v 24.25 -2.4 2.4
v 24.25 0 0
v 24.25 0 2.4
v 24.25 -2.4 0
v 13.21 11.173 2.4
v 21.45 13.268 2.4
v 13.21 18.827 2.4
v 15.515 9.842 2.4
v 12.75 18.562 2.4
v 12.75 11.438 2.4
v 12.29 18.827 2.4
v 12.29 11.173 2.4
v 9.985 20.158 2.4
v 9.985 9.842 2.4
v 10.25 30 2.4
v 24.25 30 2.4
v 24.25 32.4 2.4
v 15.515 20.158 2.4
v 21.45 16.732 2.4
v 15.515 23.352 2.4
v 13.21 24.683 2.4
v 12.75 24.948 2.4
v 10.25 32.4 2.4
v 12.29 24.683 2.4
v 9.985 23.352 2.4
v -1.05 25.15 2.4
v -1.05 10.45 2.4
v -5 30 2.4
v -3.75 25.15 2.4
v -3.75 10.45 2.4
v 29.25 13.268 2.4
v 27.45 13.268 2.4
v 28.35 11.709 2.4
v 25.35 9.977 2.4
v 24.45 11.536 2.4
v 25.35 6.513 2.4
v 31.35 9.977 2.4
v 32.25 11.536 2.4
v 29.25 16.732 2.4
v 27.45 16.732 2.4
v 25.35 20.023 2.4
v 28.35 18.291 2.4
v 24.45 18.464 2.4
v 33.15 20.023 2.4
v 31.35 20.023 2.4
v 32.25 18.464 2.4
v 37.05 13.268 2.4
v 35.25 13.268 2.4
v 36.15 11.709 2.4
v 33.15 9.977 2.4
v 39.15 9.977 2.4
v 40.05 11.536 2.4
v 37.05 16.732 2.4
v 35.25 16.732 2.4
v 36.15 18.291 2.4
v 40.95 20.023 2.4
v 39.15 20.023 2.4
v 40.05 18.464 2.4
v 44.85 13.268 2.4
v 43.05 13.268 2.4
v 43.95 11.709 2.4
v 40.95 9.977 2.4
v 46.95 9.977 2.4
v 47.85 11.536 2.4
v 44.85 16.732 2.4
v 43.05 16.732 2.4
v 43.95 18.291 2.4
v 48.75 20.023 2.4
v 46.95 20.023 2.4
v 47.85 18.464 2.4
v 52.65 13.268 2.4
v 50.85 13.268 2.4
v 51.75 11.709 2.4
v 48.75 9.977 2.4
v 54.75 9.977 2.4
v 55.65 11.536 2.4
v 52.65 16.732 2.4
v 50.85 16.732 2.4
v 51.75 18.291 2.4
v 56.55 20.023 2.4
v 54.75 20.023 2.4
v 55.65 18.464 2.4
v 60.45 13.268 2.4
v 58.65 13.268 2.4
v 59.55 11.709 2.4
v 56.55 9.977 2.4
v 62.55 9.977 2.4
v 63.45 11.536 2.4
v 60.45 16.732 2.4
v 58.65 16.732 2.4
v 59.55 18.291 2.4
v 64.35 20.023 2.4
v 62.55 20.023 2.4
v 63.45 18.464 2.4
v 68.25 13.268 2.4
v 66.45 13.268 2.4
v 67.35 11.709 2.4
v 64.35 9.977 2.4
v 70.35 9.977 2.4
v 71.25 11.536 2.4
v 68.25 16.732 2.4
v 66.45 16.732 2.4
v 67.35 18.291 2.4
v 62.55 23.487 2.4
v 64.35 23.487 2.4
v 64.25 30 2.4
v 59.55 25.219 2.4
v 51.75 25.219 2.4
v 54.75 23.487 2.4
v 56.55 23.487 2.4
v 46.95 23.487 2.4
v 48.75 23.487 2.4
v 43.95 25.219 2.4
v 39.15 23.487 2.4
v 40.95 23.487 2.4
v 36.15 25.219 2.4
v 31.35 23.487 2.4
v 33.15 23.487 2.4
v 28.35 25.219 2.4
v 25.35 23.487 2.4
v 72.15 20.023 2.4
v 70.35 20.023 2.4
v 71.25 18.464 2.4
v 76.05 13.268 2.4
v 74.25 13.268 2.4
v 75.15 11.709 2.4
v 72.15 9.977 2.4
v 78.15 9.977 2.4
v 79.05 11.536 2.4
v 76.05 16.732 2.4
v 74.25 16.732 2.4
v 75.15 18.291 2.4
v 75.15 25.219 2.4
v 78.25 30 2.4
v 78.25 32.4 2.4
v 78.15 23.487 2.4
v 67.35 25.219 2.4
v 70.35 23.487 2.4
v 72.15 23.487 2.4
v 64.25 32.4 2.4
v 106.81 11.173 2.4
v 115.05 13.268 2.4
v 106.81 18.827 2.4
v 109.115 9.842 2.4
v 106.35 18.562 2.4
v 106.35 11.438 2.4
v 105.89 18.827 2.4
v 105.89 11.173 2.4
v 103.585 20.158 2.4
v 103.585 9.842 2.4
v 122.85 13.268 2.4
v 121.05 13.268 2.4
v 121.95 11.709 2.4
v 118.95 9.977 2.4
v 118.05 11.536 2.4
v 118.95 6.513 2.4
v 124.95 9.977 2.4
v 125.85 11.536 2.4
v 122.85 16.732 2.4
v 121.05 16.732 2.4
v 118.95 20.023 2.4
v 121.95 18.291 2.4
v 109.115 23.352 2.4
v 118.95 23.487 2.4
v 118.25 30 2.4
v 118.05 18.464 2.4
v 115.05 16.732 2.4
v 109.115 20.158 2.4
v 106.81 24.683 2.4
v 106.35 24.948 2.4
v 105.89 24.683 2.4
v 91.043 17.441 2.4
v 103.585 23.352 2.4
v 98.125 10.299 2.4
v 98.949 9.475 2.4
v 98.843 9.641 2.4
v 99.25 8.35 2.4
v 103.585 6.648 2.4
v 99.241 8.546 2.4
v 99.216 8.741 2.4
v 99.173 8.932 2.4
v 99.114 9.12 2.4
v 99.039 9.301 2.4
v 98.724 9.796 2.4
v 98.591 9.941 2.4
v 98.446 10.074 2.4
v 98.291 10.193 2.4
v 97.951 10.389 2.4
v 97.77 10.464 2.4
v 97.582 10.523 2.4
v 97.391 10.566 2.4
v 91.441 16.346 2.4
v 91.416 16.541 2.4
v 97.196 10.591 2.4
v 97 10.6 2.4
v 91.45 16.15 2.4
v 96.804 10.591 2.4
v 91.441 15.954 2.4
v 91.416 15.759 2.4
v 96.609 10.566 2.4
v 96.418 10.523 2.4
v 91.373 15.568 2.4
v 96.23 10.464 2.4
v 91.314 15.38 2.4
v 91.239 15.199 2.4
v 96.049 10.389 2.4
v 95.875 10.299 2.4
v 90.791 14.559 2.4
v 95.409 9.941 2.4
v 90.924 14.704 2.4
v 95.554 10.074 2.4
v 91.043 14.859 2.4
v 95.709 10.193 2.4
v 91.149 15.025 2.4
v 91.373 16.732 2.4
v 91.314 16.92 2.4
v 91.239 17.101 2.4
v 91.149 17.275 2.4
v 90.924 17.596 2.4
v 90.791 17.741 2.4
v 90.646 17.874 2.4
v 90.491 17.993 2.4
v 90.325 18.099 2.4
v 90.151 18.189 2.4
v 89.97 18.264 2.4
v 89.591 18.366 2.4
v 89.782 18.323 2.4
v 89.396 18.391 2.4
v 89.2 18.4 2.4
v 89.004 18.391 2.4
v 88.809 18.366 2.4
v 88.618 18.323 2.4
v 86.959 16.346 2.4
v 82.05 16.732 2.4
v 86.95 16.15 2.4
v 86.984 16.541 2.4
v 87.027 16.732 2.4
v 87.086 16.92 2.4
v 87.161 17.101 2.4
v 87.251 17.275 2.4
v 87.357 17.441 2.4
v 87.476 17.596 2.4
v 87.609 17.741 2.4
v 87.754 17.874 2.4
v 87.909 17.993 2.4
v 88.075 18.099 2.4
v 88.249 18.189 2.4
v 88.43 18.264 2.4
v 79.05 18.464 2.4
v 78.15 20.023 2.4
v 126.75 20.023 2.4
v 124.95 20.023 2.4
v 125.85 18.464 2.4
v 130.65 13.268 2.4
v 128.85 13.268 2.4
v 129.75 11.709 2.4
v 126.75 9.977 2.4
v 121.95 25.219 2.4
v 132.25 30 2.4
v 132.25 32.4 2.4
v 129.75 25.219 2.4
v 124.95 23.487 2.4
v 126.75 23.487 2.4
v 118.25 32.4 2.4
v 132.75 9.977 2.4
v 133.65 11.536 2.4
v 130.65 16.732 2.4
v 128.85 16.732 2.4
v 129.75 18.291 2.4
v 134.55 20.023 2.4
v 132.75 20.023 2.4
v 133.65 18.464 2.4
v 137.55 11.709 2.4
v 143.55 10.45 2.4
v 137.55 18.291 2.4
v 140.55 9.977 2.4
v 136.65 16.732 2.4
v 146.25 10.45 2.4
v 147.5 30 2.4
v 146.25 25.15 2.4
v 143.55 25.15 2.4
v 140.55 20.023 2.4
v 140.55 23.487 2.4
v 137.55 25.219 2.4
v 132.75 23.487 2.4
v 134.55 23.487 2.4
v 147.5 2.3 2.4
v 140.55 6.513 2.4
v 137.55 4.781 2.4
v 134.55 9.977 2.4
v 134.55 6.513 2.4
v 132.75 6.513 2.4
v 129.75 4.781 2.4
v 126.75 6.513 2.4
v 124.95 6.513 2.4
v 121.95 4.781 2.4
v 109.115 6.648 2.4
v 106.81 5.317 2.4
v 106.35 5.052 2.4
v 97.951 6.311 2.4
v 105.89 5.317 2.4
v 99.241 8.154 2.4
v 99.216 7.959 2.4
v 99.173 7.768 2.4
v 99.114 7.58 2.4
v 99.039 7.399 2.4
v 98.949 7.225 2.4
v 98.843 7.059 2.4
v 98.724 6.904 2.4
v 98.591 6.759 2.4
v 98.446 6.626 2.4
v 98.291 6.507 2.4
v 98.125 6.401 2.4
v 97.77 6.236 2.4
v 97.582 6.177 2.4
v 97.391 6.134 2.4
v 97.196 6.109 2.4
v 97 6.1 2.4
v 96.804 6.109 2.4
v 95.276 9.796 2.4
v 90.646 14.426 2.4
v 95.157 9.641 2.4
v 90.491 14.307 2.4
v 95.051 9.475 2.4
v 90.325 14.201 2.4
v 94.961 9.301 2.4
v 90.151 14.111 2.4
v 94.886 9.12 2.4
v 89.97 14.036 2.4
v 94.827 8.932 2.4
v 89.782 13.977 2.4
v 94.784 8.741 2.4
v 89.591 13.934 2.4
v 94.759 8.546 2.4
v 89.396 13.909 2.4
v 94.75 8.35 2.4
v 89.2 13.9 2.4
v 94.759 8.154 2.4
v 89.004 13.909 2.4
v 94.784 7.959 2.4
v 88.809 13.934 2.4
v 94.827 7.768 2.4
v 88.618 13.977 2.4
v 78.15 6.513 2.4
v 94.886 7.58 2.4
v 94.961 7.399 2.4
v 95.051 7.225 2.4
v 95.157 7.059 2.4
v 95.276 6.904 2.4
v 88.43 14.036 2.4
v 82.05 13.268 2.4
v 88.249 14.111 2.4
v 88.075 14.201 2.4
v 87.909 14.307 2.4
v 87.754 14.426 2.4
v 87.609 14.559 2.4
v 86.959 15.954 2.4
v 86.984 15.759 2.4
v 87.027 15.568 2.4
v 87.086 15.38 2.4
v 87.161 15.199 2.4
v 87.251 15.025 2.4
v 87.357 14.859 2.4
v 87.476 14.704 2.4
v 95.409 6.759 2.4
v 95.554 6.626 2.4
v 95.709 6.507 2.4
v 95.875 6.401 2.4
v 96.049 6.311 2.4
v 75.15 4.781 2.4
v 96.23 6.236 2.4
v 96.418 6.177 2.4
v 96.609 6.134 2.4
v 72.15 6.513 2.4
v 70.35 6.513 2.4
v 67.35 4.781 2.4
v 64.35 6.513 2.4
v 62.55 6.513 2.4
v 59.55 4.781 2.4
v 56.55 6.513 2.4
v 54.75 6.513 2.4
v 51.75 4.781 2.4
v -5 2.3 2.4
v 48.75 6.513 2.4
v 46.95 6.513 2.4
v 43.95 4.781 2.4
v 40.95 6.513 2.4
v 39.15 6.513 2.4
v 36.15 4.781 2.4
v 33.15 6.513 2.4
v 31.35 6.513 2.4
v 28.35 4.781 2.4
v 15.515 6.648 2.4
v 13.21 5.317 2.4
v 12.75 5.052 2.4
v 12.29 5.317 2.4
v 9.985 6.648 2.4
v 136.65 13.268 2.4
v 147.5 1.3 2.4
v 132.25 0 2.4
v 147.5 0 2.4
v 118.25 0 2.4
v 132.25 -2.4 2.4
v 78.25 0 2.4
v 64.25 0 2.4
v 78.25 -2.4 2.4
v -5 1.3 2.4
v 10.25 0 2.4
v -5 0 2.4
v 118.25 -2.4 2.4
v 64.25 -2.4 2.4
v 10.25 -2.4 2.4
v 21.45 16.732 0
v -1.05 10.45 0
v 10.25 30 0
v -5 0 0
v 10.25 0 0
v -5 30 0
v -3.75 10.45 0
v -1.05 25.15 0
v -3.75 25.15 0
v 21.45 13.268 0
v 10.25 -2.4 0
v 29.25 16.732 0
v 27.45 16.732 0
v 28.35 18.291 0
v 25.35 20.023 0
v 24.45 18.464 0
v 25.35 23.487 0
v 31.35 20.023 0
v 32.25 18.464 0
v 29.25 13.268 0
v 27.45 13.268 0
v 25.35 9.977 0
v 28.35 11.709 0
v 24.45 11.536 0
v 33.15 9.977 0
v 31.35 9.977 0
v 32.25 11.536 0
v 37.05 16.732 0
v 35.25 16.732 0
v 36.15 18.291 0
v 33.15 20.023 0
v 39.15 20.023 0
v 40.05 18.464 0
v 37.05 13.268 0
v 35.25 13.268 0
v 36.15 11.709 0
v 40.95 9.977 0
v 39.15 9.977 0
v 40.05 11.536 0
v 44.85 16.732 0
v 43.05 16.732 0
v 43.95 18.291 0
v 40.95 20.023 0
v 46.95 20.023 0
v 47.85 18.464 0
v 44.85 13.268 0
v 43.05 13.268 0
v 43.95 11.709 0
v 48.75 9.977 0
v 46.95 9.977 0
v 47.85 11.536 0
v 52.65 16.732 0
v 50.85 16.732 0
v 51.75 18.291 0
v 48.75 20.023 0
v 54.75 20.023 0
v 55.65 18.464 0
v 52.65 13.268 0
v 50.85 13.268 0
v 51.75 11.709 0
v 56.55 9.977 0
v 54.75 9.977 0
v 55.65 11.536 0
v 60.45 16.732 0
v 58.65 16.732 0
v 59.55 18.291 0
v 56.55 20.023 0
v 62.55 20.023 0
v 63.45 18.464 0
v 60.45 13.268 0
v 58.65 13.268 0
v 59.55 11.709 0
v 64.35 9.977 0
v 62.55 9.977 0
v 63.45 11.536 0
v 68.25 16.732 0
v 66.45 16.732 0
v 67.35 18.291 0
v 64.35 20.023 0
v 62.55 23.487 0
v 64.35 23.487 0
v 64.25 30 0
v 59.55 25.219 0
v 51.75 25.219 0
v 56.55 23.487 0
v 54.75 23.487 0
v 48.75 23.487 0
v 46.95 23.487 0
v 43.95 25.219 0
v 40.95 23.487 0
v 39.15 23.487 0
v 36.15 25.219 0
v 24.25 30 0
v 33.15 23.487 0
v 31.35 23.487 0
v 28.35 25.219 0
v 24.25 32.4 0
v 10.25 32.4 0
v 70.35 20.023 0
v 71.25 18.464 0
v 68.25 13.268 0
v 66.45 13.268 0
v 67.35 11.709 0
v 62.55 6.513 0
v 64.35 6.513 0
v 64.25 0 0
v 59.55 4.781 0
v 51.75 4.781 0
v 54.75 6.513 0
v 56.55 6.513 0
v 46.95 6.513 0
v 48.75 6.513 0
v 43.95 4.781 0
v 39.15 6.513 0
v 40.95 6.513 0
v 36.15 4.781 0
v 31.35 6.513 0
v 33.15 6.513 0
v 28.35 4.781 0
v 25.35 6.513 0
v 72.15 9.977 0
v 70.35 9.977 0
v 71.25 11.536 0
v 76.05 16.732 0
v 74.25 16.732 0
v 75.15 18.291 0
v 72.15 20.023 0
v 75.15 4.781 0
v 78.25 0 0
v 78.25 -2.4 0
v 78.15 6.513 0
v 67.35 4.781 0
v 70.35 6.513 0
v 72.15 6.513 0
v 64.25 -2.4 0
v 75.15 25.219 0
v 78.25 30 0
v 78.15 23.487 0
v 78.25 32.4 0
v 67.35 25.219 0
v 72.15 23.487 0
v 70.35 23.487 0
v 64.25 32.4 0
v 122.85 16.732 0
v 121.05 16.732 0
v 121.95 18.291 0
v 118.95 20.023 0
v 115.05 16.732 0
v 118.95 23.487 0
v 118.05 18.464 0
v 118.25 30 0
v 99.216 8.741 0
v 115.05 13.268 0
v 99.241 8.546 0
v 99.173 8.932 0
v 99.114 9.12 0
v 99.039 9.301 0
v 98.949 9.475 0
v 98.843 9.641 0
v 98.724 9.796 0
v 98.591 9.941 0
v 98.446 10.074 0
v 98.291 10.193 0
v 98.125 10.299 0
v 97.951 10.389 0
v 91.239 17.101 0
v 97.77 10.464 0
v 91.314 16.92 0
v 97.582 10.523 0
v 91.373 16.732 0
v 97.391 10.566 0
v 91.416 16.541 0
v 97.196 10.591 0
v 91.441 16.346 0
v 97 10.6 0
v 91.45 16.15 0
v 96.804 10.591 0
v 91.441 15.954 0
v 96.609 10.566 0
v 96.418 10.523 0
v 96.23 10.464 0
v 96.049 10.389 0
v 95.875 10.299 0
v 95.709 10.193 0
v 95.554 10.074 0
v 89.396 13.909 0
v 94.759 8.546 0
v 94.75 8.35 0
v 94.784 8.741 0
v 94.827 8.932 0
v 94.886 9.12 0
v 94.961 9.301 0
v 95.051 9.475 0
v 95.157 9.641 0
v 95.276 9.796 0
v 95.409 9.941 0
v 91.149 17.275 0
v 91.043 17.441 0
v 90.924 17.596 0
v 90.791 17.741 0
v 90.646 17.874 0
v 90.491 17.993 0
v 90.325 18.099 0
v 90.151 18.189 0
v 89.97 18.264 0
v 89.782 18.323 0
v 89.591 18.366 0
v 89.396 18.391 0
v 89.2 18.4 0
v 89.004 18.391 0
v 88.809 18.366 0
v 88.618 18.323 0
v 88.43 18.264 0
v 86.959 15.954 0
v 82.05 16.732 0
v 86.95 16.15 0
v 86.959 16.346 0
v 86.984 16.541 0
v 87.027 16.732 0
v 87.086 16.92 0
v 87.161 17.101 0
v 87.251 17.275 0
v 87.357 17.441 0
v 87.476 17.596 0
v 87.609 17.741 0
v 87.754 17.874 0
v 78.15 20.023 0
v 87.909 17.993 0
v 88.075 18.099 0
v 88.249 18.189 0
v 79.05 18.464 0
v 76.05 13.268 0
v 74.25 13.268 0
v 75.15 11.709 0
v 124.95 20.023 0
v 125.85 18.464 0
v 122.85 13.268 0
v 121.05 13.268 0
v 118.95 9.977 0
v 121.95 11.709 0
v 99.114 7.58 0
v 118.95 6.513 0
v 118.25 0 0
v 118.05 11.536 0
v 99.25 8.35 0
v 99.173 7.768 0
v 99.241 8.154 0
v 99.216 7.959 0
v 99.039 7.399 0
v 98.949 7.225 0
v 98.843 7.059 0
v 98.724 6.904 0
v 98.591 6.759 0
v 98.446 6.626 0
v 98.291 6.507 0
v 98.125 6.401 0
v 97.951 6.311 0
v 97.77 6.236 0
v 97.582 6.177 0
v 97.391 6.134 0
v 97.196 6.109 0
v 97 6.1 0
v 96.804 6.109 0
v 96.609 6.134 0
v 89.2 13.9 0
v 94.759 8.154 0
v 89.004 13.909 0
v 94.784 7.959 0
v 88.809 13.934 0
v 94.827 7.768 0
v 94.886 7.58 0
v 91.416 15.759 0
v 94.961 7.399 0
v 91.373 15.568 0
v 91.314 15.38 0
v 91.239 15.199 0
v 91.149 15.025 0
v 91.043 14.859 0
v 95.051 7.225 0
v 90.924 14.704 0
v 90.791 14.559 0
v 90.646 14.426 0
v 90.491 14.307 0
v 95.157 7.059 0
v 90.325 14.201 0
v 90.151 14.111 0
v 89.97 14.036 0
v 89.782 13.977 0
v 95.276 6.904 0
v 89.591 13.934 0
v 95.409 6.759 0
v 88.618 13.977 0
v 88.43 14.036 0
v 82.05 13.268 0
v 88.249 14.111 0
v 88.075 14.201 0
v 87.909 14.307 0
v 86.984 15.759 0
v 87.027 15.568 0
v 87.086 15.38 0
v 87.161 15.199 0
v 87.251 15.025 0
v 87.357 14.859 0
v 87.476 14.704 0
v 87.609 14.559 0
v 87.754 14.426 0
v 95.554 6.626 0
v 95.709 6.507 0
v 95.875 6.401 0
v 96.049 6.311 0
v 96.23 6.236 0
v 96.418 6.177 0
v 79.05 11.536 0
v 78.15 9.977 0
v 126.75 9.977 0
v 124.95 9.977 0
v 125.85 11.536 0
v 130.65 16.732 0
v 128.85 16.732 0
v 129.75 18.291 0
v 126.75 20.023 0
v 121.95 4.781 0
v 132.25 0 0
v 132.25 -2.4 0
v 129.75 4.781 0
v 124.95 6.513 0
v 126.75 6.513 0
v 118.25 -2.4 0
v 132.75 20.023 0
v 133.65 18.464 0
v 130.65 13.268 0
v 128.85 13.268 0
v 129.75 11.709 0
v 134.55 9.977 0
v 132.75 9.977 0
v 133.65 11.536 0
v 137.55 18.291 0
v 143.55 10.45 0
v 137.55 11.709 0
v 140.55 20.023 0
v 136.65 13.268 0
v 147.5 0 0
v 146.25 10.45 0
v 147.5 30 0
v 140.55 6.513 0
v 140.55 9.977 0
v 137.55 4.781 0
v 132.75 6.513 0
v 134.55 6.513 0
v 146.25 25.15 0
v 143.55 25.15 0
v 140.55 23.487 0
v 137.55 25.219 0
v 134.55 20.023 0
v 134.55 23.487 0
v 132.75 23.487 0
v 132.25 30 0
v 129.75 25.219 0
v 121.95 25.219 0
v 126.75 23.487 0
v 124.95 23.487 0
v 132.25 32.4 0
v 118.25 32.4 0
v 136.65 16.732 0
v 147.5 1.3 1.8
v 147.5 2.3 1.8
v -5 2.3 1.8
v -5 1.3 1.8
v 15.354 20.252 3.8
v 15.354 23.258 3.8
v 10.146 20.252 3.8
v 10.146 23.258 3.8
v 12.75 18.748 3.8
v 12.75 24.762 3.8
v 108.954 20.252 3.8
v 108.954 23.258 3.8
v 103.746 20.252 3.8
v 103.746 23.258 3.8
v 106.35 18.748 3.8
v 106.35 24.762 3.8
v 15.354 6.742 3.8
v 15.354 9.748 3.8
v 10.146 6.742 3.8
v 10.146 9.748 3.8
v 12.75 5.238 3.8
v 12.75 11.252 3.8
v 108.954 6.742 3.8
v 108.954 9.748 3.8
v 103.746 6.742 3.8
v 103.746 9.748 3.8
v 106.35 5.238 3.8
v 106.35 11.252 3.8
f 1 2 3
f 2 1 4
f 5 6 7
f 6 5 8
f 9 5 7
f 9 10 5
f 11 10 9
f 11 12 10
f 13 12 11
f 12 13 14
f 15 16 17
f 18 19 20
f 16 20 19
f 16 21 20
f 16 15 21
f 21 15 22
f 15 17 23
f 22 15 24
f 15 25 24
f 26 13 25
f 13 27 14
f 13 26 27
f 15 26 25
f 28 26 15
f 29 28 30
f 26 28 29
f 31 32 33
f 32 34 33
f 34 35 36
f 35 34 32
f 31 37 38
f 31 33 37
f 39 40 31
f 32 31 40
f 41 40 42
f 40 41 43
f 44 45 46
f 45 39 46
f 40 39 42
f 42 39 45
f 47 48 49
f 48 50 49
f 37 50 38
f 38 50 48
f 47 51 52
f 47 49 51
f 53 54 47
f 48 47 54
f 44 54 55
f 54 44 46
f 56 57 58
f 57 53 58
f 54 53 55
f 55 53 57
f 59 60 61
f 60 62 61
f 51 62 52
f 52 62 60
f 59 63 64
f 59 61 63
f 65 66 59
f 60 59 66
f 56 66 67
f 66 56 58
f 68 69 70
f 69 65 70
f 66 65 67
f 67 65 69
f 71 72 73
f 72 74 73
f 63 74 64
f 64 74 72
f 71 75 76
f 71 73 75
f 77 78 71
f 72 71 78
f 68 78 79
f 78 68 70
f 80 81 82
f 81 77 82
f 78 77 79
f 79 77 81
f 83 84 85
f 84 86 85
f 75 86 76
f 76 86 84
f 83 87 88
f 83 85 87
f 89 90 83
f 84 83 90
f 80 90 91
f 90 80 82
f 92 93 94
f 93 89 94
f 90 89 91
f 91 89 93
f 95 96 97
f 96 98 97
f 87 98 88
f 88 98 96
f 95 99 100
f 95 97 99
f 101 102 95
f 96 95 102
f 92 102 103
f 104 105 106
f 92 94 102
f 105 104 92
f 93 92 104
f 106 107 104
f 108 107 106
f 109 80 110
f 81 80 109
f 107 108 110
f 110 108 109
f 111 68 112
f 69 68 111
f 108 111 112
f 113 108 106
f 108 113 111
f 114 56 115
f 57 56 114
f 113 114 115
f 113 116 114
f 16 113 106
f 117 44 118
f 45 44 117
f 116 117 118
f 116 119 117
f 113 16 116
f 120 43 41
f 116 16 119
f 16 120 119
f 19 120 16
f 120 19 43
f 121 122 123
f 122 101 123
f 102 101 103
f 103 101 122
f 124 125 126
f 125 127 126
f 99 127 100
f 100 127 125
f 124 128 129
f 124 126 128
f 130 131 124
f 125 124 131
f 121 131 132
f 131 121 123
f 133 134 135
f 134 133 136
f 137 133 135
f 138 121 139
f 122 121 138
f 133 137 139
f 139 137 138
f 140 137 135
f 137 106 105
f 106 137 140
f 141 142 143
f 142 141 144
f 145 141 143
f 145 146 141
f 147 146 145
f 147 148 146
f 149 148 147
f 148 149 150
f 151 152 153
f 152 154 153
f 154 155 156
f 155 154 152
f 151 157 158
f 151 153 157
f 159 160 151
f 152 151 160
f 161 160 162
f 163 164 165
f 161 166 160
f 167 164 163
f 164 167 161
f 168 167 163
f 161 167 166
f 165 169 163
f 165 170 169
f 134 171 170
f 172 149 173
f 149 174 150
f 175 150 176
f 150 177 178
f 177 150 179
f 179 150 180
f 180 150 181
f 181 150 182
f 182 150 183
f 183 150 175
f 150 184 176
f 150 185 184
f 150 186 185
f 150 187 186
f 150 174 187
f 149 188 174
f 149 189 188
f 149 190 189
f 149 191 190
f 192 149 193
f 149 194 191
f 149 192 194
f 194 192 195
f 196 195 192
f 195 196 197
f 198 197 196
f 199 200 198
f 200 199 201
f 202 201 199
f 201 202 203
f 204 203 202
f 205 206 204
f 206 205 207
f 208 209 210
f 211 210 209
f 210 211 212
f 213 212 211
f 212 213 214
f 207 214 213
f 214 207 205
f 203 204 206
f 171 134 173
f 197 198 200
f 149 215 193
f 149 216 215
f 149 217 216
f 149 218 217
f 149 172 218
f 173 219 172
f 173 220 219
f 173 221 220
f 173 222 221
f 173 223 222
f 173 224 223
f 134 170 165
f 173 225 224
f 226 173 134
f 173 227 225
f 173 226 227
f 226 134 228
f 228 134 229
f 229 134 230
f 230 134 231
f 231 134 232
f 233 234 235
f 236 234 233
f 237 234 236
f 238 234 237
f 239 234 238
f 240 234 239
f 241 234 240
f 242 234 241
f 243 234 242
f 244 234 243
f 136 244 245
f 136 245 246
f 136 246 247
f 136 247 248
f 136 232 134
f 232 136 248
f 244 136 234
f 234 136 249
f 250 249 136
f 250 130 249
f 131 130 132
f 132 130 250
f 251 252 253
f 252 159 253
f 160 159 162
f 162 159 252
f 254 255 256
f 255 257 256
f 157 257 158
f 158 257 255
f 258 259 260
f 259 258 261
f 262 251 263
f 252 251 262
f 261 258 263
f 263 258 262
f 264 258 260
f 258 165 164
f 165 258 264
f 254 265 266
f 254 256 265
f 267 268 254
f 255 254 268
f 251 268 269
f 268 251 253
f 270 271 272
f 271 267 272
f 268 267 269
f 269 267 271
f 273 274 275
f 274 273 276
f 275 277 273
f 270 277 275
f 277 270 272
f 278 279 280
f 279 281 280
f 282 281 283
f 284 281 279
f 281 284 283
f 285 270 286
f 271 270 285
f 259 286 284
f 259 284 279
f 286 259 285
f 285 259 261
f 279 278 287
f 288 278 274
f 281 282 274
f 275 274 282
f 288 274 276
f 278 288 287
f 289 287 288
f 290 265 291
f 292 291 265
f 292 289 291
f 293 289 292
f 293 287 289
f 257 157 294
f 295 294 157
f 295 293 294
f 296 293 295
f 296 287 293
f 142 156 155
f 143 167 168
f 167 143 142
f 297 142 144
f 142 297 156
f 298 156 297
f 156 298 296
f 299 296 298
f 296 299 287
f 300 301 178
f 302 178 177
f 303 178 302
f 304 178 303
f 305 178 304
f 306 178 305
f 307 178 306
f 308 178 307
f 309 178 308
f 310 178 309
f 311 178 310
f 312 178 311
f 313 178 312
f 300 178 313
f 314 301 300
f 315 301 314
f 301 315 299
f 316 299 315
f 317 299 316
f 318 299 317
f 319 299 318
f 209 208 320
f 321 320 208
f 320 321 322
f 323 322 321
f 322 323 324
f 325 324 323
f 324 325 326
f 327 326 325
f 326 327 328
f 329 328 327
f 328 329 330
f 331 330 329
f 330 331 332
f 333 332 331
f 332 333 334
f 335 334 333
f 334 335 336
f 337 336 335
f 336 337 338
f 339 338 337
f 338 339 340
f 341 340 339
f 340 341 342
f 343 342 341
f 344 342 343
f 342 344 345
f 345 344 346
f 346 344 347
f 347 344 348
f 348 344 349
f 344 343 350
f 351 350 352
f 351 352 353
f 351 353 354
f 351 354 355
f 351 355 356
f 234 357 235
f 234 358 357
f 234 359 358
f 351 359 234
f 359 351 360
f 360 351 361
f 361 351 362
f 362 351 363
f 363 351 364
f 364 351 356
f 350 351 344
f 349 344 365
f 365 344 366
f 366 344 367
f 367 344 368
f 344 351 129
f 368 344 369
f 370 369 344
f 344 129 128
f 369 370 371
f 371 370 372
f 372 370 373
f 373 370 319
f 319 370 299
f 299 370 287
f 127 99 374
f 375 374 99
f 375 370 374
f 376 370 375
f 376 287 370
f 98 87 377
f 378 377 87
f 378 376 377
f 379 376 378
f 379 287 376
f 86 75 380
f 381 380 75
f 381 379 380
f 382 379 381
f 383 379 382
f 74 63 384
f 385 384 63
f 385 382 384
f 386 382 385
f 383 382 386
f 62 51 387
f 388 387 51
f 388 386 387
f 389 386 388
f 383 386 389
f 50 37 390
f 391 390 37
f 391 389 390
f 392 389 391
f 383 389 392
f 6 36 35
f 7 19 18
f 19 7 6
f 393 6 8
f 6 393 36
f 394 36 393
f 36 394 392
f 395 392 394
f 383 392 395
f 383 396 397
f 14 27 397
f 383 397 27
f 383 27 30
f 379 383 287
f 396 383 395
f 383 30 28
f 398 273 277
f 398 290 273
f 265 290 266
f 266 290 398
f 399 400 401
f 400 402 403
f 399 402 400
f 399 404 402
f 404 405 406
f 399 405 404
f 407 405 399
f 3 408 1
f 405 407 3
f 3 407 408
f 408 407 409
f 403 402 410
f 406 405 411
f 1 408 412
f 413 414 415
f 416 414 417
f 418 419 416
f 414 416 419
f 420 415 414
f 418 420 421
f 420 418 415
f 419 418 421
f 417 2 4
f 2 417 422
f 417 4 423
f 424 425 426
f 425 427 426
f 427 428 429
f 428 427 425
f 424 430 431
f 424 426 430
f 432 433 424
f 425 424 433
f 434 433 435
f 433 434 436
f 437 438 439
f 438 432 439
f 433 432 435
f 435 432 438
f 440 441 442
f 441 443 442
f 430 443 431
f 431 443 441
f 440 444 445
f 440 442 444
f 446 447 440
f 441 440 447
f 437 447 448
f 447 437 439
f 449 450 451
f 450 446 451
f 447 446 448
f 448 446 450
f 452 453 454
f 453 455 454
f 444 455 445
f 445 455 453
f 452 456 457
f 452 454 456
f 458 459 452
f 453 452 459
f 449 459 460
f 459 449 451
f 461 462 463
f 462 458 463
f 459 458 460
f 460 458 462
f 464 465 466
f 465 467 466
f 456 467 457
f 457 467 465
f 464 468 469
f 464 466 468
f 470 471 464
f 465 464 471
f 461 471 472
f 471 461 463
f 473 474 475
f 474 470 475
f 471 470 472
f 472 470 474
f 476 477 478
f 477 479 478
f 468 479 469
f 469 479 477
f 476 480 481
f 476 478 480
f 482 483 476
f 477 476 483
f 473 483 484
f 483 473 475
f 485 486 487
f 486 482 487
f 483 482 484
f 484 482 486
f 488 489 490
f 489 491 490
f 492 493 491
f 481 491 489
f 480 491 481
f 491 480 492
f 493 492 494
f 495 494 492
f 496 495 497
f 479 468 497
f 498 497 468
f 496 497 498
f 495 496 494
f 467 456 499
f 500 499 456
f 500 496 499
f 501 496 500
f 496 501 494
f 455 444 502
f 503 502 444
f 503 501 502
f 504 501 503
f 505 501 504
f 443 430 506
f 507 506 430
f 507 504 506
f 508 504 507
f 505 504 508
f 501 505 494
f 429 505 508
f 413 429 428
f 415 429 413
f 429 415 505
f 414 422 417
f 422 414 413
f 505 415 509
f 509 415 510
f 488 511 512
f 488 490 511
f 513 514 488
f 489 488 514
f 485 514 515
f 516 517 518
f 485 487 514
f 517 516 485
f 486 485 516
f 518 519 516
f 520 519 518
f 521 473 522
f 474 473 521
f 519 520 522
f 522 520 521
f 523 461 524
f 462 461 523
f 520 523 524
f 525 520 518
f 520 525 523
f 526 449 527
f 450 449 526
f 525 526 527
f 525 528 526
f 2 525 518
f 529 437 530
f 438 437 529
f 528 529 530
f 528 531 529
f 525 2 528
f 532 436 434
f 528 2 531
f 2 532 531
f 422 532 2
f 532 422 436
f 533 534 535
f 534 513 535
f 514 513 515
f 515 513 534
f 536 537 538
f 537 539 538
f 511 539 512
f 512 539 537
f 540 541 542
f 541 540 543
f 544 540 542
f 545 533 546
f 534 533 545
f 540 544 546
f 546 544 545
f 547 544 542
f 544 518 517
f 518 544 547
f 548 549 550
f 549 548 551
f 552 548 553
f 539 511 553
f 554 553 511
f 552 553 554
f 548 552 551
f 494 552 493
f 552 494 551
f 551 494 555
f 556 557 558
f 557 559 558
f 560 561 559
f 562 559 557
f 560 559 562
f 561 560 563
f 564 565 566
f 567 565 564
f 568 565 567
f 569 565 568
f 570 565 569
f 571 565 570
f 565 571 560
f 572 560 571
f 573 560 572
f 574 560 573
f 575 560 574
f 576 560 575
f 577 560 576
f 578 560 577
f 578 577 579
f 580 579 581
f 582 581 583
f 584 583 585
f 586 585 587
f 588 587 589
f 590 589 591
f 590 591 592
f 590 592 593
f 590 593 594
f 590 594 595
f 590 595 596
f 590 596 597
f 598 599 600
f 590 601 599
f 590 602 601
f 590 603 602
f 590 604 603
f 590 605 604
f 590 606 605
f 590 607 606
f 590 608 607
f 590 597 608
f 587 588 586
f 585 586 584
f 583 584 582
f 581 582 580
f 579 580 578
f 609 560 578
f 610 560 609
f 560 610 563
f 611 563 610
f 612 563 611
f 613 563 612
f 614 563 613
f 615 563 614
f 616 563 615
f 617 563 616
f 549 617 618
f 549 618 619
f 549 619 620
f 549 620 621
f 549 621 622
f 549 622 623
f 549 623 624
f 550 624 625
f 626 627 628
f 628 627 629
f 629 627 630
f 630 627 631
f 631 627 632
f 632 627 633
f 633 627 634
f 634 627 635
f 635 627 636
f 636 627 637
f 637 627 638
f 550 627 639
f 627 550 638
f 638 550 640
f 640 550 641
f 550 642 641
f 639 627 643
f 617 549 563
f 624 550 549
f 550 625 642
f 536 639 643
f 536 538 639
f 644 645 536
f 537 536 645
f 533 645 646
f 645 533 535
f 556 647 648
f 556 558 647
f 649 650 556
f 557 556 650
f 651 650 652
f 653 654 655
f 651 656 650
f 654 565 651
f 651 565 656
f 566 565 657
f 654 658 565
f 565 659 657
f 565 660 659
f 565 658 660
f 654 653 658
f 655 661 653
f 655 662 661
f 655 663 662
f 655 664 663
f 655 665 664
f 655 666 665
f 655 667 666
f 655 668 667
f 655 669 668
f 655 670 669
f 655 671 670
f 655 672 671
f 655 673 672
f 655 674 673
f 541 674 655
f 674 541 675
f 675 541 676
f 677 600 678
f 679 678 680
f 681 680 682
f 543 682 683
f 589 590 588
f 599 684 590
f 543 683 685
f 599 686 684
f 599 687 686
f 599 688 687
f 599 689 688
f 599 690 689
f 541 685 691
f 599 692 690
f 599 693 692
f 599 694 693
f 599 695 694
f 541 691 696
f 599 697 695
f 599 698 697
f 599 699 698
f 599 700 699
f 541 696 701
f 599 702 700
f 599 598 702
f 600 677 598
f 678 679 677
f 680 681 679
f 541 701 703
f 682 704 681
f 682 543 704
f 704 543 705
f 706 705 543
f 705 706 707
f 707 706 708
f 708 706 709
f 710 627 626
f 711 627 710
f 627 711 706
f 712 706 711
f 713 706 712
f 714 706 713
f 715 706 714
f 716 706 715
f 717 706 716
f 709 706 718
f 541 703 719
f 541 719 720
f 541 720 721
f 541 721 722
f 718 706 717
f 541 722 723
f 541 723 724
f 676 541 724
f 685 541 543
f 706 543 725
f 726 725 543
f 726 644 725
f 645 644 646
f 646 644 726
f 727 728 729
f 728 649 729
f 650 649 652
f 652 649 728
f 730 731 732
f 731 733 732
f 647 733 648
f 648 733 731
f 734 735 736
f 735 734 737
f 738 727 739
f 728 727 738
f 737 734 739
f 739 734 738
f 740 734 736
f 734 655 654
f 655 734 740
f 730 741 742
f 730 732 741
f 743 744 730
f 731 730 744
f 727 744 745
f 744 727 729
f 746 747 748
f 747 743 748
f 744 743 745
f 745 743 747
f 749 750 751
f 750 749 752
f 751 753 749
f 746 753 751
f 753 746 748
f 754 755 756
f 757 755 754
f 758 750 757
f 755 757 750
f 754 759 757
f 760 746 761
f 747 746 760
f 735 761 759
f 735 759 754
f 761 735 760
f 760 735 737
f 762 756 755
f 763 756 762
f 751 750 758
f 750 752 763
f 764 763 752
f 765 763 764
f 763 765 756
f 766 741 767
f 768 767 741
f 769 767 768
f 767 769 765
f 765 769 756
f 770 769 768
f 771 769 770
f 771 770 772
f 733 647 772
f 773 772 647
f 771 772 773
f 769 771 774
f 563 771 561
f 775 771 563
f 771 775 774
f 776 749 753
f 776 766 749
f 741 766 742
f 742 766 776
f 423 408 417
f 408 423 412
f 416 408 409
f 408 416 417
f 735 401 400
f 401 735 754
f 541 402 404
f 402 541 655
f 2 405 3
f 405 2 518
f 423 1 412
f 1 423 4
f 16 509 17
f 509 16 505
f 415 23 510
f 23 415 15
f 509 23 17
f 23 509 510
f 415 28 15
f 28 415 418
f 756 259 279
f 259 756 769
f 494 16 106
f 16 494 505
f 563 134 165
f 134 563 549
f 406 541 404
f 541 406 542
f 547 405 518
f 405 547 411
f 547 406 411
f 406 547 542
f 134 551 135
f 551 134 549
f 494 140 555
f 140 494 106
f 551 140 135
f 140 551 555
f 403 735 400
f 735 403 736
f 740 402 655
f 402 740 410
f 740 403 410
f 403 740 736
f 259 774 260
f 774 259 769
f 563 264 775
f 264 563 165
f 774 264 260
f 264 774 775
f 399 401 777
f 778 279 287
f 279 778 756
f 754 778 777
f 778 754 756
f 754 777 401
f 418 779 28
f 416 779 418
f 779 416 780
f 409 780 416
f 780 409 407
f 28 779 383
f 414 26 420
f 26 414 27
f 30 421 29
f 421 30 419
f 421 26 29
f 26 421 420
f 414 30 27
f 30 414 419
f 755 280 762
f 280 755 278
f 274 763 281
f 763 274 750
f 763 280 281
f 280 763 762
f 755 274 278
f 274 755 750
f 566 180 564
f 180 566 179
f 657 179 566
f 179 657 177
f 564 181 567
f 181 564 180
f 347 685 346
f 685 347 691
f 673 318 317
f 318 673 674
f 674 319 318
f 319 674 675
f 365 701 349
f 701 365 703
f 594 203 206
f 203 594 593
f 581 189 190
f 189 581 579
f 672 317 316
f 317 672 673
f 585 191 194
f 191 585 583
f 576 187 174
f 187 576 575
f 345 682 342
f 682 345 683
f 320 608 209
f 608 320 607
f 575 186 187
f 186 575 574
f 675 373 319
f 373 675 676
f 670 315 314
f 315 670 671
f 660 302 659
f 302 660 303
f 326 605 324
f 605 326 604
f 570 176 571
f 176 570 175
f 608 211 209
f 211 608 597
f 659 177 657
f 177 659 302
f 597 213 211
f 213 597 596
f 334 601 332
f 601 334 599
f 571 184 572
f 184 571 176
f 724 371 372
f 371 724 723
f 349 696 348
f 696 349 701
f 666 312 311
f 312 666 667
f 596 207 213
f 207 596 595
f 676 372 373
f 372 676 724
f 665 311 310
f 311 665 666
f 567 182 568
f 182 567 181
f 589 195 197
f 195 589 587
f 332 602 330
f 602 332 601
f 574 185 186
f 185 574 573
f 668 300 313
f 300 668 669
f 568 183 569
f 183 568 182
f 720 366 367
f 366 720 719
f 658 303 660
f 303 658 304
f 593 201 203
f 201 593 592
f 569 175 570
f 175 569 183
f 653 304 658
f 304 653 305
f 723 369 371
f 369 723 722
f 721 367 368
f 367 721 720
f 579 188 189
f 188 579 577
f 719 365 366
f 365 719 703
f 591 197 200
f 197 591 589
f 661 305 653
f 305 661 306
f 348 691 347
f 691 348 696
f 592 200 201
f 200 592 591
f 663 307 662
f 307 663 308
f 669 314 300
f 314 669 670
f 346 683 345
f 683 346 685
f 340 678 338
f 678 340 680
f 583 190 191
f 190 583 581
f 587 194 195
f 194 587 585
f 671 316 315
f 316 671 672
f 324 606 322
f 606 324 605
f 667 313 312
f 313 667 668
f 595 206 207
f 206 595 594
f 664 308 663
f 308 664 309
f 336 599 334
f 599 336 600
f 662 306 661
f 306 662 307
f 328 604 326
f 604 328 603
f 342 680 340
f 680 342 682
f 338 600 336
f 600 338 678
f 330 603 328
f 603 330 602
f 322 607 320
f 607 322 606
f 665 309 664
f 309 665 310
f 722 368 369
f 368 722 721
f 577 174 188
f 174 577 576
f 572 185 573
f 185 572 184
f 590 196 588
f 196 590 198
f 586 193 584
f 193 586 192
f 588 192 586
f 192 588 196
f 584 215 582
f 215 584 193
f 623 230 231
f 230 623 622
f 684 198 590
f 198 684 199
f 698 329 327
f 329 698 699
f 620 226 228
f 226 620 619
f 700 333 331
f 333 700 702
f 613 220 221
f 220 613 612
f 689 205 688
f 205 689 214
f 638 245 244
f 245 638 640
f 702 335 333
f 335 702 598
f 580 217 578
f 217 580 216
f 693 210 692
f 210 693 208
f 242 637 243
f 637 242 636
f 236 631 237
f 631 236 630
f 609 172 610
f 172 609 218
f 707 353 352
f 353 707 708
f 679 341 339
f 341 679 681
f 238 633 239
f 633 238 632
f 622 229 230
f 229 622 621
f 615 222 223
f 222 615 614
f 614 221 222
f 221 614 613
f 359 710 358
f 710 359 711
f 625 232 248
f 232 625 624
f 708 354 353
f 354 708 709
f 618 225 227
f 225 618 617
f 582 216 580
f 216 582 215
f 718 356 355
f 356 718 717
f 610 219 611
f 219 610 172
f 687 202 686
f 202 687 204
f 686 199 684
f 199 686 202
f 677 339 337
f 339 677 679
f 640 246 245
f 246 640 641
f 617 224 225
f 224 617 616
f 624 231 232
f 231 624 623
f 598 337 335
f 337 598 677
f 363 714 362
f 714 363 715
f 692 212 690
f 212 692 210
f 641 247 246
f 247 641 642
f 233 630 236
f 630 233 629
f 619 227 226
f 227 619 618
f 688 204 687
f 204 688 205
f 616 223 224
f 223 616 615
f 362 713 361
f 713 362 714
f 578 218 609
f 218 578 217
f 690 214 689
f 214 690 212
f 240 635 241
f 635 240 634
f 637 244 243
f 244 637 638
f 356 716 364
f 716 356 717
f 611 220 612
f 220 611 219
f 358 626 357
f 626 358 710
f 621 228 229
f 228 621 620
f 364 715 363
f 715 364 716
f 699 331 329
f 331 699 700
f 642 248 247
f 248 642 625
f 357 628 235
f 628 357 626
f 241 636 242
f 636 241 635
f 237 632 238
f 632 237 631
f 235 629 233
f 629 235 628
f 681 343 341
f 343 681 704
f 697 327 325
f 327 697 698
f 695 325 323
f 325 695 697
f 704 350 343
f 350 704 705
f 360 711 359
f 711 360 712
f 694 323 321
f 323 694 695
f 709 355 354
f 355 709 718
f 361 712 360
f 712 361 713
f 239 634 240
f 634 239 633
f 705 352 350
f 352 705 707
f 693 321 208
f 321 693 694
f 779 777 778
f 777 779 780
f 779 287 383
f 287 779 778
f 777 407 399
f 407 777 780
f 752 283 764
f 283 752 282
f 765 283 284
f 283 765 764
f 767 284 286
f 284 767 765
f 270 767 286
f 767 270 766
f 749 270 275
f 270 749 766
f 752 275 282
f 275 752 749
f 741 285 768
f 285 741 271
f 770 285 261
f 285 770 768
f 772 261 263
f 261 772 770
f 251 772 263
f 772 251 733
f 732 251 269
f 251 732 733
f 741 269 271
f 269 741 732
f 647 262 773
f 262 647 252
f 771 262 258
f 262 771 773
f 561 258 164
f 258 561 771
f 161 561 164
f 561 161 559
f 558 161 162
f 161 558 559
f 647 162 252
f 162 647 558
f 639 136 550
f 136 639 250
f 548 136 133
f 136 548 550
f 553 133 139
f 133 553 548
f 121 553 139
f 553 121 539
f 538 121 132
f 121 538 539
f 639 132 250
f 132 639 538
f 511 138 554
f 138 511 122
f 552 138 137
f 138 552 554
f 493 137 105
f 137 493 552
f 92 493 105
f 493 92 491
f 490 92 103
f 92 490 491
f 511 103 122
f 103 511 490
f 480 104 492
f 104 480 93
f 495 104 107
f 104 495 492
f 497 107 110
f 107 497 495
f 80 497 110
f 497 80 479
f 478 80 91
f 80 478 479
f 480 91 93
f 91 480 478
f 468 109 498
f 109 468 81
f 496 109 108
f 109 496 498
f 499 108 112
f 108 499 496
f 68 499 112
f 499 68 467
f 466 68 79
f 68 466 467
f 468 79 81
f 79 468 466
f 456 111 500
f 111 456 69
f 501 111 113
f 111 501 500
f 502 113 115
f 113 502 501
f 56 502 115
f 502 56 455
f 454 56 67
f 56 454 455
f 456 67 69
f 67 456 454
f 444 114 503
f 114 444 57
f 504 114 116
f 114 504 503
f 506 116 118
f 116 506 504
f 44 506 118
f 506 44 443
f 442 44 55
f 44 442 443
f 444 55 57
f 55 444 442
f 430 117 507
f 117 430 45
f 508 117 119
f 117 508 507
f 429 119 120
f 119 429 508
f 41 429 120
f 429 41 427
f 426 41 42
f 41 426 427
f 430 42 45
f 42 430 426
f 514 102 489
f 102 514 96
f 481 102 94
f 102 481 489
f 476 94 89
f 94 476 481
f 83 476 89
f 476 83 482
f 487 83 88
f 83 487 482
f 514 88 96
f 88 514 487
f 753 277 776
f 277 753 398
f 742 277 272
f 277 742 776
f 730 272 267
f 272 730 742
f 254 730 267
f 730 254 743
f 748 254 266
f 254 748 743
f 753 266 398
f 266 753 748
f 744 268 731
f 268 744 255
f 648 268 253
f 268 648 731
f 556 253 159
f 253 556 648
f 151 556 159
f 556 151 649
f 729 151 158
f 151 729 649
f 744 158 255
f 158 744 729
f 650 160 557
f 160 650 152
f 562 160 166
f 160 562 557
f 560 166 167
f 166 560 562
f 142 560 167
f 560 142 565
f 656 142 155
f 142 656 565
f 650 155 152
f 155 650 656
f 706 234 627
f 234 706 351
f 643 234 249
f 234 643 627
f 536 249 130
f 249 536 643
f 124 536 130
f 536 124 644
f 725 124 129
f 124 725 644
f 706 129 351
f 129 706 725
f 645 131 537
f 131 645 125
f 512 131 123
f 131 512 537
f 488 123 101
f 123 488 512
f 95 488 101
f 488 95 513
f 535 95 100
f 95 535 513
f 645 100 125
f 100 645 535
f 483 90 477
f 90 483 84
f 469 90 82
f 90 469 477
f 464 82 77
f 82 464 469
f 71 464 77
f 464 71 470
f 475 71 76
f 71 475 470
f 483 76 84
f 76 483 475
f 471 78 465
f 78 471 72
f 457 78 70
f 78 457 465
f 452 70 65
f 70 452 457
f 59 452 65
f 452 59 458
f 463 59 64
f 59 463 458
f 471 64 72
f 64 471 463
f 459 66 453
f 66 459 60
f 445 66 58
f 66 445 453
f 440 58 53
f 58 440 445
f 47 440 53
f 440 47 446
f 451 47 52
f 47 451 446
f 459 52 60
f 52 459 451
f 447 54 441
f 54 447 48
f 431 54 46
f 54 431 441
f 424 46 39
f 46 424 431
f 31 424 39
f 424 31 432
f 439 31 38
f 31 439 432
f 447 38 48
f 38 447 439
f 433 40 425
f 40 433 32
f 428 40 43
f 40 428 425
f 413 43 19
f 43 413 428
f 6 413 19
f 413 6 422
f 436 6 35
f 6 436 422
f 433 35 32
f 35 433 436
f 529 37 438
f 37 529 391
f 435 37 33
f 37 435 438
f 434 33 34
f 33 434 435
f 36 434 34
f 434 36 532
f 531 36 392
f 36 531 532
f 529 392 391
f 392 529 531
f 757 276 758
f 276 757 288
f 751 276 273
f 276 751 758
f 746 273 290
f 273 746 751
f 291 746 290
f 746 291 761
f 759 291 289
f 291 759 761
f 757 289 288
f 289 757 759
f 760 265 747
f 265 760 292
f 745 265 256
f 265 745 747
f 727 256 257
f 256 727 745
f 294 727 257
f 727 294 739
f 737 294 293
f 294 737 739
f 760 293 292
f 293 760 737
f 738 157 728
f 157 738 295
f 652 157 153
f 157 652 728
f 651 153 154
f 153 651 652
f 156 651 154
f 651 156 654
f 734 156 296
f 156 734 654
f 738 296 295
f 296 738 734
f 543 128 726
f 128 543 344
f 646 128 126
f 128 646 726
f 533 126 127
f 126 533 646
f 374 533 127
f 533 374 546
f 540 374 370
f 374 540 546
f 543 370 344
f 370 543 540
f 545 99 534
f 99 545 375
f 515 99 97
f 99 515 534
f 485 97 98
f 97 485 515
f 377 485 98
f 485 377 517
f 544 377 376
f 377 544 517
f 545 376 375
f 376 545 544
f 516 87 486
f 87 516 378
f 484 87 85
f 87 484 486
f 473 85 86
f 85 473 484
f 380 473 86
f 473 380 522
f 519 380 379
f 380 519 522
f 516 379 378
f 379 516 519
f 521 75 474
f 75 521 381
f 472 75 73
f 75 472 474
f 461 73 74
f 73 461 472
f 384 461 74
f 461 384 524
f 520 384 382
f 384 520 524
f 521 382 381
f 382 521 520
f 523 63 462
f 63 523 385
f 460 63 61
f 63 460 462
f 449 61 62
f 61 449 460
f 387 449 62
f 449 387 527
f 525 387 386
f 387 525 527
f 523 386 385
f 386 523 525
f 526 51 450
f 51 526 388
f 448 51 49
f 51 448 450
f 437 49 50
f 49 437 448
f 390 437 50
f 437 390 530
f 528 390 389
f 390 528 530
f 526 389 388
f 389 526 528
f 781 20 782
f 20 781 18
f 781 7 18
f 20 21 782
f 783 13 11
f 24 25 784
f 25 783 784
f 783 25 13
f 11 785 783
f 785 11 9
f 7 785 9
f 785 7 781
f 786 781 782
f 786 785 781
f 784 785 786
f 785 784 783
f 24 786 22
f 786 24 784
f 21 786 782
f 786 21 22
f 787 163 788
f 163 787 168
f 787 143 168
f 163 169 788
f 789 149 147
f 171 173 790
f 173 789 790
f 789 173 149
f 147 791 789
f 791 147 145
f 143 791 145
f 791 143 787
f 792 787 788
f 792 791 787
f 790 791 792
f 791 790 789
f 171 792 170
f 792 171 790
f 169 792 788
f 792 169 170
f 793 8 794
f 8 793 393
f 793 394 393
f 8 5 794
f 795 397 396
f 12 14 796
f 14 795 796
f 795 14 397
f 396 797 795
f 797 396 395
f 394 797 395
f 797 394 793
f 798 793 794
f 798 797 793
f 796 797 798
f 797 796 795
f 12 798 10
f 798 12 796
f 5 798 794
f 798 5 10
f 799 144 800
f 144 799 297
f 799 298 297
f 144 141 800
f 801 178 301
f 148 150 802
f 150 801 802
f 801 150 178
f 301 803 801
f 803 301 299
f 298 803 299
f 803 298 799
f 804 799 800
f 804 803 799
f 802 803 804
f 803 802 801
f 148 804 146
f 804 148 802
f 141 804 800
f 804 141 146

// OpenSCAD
// file: lib.scad
// Helpers shared by the parts.
include <params.scad>

// box from corner a to corner b
module box(a, b) {
    translate([min(a[0],b[0]), min(a[1],b[1]), min(a[2],b[2])])
        cube([abs(b[0]-a[0]), abs(b[1]-a[1]), abs(b[2]-a[2])]);
}

// ---- pins ---------------------------------------------------------------
// Pin along +z from z=0: cylinder + conical tip.
module pin() {
    cylinder(d = pin_d, h = pin_len - pin_tip + 0.01);
    translate([0, 0, pin_len - pin_tip])
        cylinder(d1 = pin_d, d2 = 1.0, h = pin_tip);
}

// ---- hex bump --------------------------------------------------------
// Hexagonal bump standing on the XY plane, slight taper for a lead-in.
// Same orientation as the honeycomb cells (rotate(30)), so a plate bump
// drops straight into a cell of the plate above.
module hex_bump(af) {
    r = af / sqrt(3);
    translate([0, 0, -0.3])
        linear_extrude(height = bump_h + 0.3, scale = 0.93) rotate(30) circle(r = r, $fn = 6);
}
module hex_hole(af, t) {
    r = af / sqrt(3);
    translate([0, 0, -1]) linear_extrude(height = t + 2) rotate(30) circle(r = r, $fn = 6);
}
// keep-out rectangle for a hex bump (or hole) in a centred 2D field
function bump_keep(x, y, cx, cy, af = wall_bump_af) = let(r = af / sqrt(3) + b_keep_margin)
    [x - r - cx, y - r - cy, x + r - cx, y + r - cy];

// ---- honeycomb -----------------------------------------------------------
// 2D field of hexagonal holes filling a `size` = [w, h] rectangle centred on
// the origin. Only whole cells are emitted, so the border stays a clean web.
// `keep` lists [x0, y0, x1, y1] rectangles (same frame) no cell may touch.
function hits_keep(cx, cy, r, keep) =
    len([for (k = keep) if (cx + r > k[0] && cx - r < k[2] && cy + r > k[1] && cy - r < k[3]) 1]) > 0;

// `phase` shifts the cell grid so two fields on different parts can share
// one lattice (their cells then line up when assembled).
module hex_holes(size, cell, web, keep = [], phase = [0, 0]) {
    r  = cell / sqrt(3);            // circumradius for across-flats = cell
    dx = cell + web;
    dy = dx * sqrt(3) / 2;
    nx = ceil(size[0] / dx) + 1;
    ny = ceil(size[1] / dy) + 1;
    for (j = [-ny - 1 : ny + 1], i = [-nx - 1 : nx + 1]) {
        cx = i * dx + (j % 2 == 0 ? 0 : dx / 2) + phase[0];
        cy = j * dy + phase[1];
        if (abs(cx) + cell/2 <= size[0]/2 && abs(cy) + r <= size[1]/2
            && !hits_keep(cx, cy, r, keep))
            translate([cx, cy]) rotate(30) circle(r = r, $fn = 6);
    }
}

// Through-cut for a wall: hex field extruded `t` thick, centred on z = 0.
module honeycomb_cut(size, t, cell, web, keep = [], phase = [0, 0]) {
    linear_extrude(height = t, center = true) hex_holes(size, cell, web, keep, phase);
}
// file: bay.scad
// Bay: two identical plates, two identical walls and a rear panel, all
// printed flat, joined by tabs through slots (press fit, glue optional).
// Plate bumps drop into the honeycomb cells of the bay above and wall bumps
// into the cells of the bay beside, so bays join with no extra part. The
// rear panel squares the back and leaves the SATA plugs clear.
include <lib.scad>

// slot for a tab of length `l` centred at (x, y), through a flat part
module slot(x, y, l, w) translate([x - l/2 - tab_clr, y - w/2 - tab_clr, -1]) cube([l + 2*tab_clr, w + 2*tab_clr, 10]);

// ---- plate, own frame: flat, x b_x0..b_l, y centred, z 0..b_t, bumps on +z.
//      Same geometry top and bottom; the bottom plate is turned over when
//      assembled. Only the engraved mark differs so the two prints can be told
//      apart: top = arrow, bottom = arrow over a bar (the "floor").
module plate(kind = "top") {
    difference() {
        box([b_x0, -b_w/2, 0], [b_l, b_w/2, b_t]);
        for (x = tab_x, s = [-1, 1]) slot(x, s * (b_in_w/2 + b_wall/2), tab_len, b_wall);   // walls
        for (y = rear_slot_y) slot(rear_x + rear_t/2, y, rear_t, rear_tab);                // rear panel, both mirror images
        translate([b_xc, 0, b_t/2])
            honeycomb_cut([b_l - b_x0 - 2*b_vent_rim, b_in_w - 2*b_vent_rim], b_t + 2, hex_cell, hex_web,
                concat([for (b = plate_bumps) bump_keep(b[0], b[1], b_xc, 0, plate_bump_af)],
                       [for (x = tab_x, s = [-1, 1]) [x - tab_len/2 - b_keep_margin - b_xc, s*b_in_w/2 - 3 - b_keep_margin, x + tab_len/2 + b_keep_margin - b_xc, s*b_in_w/2 + 3 + b_keep_margin]],
                       [for (y = rear_slot_y) [rear_x - b_keep_margin - b_xc, y - rear_tab/2 - b_keep_margin, rear_x + rear_t + b_keep_margin - b_xc, y + rear_tab/2 + b_keep_margin]],
                       [[label_x - 9 - b_xc, -12, label_x + 9 - b_xc, 9]]));   // solid pad for the mark
        // orientation mark on the bump face: arrow toward the front,
        // plus a bar under it on the bottom plate
        translate([label_x, 0, b_t - groove_d]) linear_extrude(height = groove_d + 1) {
            polygon([[-mark_size, -mark_size], [-mark_size, mark_size], [mark_size, 0]]);
            if (kind == "bottom") translate([-mark_size, -mark_size - 3.5]) square([2*mark_size, 1.5]);
        }
    }
    for (b = plate_bumps) translate([b[0], b[1], b_t]) hex_bump(plate_bump_af);
}

// ---- wall, own frame: flat, x b_x0..b_l, y = height 0..b_in_h with tabs
//      beyond, z 0..b_wall, bumps on +z (the outer face when assembled).
module wall() {
    difference() {
        union() {
            box([b_x0, 0, 0], [b_l, b_in_h, b_wall]);
            for (x = tab_x, y0 = [-b_t, b_in_h])
                translate([x - tab_len/2, y0, 0]) cube([tab_len, b_t, b_wall]);
        }
        // rear panel side tab, both ends (symmetry); the slot runs one plate
        // thickness below the tab so the wall can slide in sideways while lifted
        for (x = wall_slot_x) slot(x, rear_tab_z - b_t/2, rear_t, wall_panel_slot_h);
        // orientation groove along the outer face, low down
        translate([b_x0 - 1, groove_z - groove_w/2, b_wall - groove_d]) cube([b_l - b_x0 + 2, groove_w, groove_d + 1]);
        // caddy detent holes (on the other wall they land mirrored, harmless)
        for (d = detent_pts) translate([d[0], d[1], -1]) cylinder(d = detent_hole_d, h = b_wall + 2);
        translate([b_xc, b_in_h/2, b_wall/2])
            honeycomb_cut([b_l - b_x0 - 2*w_vent_rim, b_in_h - 2*w_vent_rim], b_wall + 2, w_hex_cell, w_hex_web,
                concat([for (b = wall_bumps) bump_keep(b[0], b[1], b_xc, b_in_h/2, wall_bump_af)],
                       [for (d = detent_pts) [d[0] - detent_hole_d/2 - 3 - b_xc, d[1] - detent_hole_d/2 - 3 - b_in_h/2,
                                              d[0] + detent_hole_d/2 + 3 - b_xc, d[1] + detent_hole_d/2 + 3 - b_in_h/2]],
                       [for (x = wall_slot_x) [x - rear_t/2 - b_keep_margin - b_xc, -50, x + rear_t/2 + b_keep_margin - b_xc, 50]]));
    }
    for (b = wall_bumps) translate([b[0], b[1], b_wall]) hex_bump(wall_bump_af);
}

// ---- rear panel, own frame: flat, x = across the bay (centred), y = height
//      0..b_in_h, tabs beyond on all four edges, z 0..rear_t. The lower -y
//      corner is open for the SATA plugs.
module rear() {
    w = b_in_w - 2*rear_clr;
    difference() {
        union() {
            box([-w/2, 0, 0], [w/2, b_in_h, rear_t]);
            for (y = rear_tab_y, z0 = [-b_t, b_in_h])                       // into the plates
                translate([y - rear_tab/2, z0, 0]) cube([rear_tab, b_t, rear_t]);
            for (s = [-1, 1])                                               // into the walls
                translate([s > 0 ? w/2 : -w/2 - b_wall, rear_tab_z - rear_tab/2, 0]) cube([b_wall, rear_tab, rear_t]);
        }
        // SATA notch: open at the bottom edge and the -y edge
        translate([-w/2 - b_wall - 1, -b_t - 1, -1]) cube([w/2 + b_wall + 1 + sata_notch_y, b_t + 1 + sata_notch_z, rear_t + 2]);
        // orientation groove on the outer face (z = 0 side, which faces the rear when assembled)
        translate([-w/2 - b_wall - 1, groove_z - groove_w/2, -1]) cube([w + 2*b_wall + 2, groove_w, groove_d + 1]);
        // exhaust honeycomb over the rest
        translate([0, b_in_h/2, rear_t/2])
            honeycomb_cut([w - 2*b_vent_rim, b_in_h - 2*w_vent_rim], rear_t + 2, w_hex_cell, w_hex_web,
                [[-100, -100, sata_notch_y + b_keep_margin + 2, sata_notch_z + b_keep_margin + 2 - b_in_h/2]]);
    }
}

// ---- assembled bay in the shared frame -----------------------------------
module plates(top = true) {
    rotate([180, 0, 0]) plate("bottom");                         // bottom, bumps down
    if (top) translate([0, 0, b_in_h]) plate("top");             // top, bumps up
}
module walls() {
    translate([0, -b_in_w/2, 0]) rotate([90, 0, 0]) wall();      // -y wall, bumps out
    translate([b_x0 + b_l, b_in_w/2, 0]) rotate([0, 0, 180]) rotate([90, 0, 0]) wall();  // +y wall, same part turned
}
module rear_placed() translate([rear_x, 0, 0]) rotate([90, 0, 90]) rear();   // panel x -> y, y -> z, z -> x
module bay(top = true) { plates(top); walls(); rear_placed(); }


top = true;   // -D top=false renders the bay without its top plate
bay(top = top);
// main file
// Bay wall (print two per bay, flat, bumps up). Same part is left and right.
include <params.scad>
use <bay.scad>
wall();
